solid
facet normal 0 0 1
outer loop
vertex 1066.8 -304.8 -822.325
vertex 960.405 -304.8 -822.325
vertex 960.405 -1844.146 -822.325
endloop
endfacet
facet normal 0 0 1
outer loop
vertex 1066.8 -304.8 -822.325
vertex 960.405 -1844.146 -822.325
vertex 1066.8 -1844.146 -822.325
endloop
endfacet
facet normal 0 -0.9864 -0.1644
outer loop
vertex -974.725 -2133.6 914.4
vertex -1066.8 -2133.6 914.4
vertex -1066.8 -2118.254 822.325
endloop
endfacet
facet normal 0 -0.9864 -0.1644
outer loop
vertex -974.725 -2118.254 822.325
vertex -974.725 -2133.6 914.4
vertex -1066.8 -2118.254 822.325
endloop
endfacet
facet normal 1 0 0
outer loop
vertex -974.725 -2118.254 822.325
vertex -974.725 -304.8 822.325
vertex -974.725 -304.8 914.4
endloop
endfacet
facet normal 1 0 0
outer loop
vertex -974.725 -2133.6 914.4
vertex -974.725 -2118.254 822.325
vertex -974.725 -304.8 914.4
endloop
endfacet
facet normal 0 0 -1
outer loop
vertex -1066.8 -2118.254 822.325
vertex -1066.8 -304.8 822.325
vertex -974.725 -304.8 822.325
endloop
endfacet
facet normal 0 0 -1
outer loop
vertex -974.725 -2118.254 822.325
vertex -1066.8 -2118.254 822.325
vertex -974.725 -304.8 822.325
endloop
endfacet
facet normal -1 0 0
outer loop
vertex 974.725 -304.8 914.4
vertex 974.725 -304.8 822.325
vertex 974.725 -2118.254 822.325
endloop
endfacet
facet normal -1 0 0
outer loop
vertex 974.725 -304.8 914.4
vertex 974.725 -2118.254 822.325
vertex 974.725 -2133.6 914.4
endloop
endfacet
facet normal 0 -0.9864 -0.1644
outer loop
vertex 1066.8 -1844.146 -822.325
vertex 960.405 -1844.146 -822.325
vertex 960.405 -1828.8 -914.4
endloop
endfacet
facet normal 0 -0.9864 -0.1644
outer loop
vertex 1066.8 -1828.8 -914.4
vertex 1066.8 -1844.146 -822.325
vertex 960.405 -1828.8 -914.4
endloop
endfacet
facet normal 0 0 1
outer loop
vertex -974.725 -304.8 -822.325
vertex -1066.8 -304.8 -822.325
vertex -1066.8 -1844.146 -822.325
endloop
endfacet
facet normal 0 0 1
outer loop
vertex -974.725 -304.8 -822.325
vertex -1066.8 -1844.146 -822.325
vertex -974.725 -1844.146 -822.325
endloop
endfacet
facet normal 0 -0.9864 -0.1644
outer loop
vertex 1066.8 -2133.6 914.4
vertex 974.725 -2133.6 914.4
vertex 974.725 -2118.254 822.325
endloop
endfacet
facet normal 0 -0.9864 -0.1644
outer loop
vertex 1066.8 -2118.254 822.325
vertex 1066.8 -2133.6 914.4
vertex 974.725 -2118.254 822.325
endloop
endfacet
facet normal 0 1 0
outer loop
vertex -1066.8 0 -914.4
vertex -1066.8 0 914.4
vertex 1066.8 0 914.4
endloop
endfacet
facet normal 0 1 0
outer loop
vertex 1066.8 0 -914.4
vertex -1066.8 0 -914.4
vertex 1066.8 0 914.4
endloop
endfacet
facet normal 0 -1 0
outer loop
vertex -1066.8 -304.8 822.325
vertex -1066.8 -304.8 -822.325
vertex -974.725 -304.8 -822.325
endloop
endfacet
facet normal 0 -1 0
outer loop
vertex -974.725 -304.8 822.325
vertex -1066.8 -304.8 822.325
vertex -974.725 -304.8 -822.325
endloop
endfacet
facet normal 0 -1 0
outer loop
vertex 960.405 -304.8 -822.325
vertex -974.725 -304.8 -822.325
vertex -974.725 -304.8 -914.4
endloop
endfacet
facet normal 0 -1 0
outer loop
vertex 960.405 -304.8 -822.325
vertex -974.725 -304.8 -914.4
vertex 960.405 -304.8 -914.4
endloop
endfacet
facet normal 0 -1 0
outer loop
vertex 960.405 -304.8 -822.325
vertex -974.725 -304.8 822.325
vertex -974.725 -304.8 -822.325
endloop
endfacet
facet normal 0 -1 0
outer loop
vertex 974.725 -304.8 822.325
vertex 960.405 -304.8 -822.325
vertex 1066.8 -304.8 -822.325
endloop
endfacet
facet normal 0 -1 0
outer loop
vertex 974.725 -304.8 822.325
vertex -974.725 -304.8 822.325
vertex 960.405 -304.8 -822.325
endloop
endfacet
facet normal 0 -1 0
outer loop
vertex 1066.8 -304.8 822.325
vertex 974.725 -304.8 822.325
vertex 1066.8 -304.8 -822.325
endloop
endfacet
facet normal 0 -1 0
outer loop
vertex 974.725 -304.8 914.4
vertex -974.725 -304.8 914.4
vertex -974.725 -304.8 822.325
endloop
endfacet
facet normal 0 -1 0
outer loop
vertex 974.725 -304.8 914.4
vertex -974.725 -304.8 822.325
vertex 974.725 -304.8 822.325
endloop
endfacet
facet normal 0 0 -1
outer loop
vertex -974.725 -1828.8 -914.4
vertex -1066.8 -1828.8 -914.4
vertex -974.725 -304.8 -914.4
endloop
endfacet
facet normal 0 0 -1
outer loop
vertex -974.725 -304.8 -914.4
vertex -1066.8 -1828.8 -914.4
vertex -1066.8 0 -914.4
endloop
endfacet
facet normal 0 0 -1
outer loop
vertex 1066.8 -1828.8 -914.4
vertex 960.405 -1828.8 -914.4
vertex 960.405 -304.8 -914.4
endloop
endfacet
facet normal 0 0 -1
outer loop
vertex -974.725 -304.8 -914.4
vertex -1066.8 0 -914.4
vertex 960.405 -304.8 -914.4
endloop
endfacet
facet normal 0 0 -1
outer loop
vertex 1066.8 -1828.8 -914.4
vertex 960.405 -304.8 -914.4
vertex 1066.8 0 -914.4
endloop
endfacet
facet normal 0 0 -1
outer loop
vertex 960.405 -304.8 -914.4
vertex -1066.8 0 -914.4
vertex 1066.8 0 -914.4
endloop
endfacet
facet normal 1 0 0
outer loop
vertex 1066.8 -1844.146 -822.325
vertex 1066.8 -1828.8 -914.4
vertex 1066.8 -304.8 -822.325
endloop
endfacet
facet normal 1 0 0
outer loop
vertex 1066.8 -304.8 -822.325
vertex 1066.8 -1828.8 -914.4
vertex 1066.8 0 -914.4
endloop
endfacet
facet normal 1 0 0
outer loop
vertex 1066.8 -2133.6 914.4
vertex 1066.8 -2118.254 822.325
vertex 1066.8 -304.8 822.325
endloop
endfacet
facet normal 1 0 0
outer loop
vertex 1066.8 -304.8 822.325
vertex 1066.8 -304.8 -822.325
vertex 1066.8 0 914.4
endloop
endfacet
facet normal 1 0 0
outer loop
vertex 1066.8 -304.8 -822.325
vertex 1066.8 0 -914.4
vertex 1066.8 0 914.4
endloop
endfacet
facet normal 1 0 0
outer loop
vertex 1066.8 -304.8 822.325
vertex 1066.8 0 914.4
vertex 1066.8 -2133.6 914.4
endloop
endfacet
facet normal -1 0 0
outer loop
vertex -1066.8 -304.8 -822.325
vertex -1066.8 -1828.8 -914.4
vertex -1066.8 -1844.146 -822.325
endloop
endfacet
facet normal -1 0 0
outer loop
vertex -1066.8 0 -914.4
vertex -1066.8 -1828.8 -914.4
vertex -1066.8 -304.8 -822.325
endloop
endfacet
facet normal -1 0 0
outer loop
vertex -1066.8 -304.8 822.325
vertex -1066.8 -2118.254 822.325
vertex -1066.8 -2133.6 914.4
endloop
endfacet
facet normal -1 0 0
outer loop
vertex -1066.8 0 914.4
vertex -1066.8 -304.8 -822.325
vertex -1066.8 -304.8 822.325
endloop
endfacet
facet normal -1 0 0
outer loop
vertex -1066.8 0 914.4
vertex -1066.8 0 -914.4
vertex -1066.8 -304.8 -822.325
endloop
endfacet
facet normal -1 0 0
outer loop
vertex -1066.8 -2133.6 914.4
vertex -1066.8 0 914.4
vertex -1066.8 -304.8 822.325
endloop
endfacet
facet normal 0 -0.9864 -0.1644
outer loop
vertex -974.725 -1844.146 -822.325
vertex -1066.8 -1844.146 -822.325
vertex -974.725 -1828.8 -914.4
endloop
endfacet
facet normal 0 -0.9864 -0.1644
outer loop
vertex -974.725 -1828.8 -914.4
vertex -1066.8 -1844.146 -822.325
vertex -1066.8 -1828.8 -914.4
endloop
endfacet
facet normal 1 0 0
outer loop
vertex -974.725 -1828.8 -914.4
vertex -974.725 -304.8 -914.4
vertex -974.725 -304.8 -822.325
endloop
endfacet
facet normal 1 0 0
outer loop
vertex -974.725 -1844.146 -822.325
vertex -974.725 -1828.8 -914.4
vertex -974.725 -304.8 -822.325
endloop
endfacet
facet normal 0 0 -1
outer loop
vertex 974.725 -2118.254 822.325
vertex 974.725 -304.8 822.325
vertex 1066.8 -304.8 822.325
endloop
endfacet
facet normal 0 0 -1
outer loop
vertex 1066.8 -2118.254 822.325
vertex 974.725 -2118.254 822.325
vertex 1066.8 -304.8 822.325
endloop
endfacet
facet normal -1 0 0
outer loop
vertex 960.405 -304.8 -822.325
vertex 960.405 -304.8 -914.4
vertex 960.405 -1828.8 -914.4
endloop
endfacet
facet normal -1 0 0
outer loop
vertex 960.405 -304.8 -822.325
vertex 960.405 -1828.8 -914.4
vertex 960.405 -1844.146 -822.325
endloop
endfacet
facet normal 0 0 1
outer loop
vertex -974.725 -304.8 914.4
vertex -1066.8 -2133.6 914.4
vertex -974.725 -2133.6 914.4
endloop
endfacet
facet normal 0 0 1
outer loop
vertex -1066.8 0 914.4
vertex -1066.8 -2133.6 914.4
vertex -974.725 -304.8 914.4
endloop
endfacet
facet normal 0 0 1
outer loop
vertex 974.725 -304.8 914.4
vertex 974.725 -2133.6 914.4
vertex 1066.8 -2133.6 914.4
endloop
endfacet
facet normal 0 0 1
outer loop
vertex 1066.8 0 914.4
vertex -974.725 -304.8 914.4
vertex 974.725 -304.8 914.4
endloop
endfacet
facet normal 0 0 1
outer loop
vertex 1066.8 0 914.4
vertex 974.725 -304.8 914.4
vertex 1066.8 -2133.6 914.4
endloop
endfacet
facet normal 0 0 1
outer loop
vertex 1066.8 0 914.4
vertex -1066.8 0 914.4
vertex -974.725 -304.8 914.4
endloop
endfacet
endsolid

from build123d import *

# Parameters (mm, degrees)
F0_W     = 2133.6
F0_H     = 1828.8
F1_DEPTH = 304.8
F2_W     = 92.075
F2_H     = 92.075
F2_W_2   = 106.395008
F3_DEPTH = 1828.8
F5_DEPTH = 2133.6


with BuildPart() as f1:
    # F0 (on Front) → F1 (new body)
    with BuildSketch(Plane.XZ):
        Rectangle(F0_W, F0_H)
    extrude(amount=F1_DEPTH)

    # F2 (on face) → F3 (join)
    with BuildSketch(Plane.XZ.offset(304.8)):
        with Locations((-1020.7625, 868.3625)):
            Rectangle(F2_W, F2_H)
        with Locations((-1020.7625, -868.3625)):
            Rectangle(F2_W, F2_H)
        with Locations((1020.7625, 868.3625)):
            Rectangle(F2_W, F2_H)
        with Locations((1013.602496, -868.3625)):
            Rectangle(F2_W_2, F2_H)
    extrude(amount=F3_DEPTH)

    # F4 (on face) → F5 (cut)
    with BuildSketch(Plane(origin=(-1066.8, 0, 0), x_dir=(0, -1, 0), z_dir=(-1, 0, 0))):
        Polygon((2133.6, -914.4), (2133.6, 914.4), (1828.8, -914.4), align=None)
    extrude(amount=-F5_DEPTH, mode=Mode.SUBTRACT)


solid = f1.part
